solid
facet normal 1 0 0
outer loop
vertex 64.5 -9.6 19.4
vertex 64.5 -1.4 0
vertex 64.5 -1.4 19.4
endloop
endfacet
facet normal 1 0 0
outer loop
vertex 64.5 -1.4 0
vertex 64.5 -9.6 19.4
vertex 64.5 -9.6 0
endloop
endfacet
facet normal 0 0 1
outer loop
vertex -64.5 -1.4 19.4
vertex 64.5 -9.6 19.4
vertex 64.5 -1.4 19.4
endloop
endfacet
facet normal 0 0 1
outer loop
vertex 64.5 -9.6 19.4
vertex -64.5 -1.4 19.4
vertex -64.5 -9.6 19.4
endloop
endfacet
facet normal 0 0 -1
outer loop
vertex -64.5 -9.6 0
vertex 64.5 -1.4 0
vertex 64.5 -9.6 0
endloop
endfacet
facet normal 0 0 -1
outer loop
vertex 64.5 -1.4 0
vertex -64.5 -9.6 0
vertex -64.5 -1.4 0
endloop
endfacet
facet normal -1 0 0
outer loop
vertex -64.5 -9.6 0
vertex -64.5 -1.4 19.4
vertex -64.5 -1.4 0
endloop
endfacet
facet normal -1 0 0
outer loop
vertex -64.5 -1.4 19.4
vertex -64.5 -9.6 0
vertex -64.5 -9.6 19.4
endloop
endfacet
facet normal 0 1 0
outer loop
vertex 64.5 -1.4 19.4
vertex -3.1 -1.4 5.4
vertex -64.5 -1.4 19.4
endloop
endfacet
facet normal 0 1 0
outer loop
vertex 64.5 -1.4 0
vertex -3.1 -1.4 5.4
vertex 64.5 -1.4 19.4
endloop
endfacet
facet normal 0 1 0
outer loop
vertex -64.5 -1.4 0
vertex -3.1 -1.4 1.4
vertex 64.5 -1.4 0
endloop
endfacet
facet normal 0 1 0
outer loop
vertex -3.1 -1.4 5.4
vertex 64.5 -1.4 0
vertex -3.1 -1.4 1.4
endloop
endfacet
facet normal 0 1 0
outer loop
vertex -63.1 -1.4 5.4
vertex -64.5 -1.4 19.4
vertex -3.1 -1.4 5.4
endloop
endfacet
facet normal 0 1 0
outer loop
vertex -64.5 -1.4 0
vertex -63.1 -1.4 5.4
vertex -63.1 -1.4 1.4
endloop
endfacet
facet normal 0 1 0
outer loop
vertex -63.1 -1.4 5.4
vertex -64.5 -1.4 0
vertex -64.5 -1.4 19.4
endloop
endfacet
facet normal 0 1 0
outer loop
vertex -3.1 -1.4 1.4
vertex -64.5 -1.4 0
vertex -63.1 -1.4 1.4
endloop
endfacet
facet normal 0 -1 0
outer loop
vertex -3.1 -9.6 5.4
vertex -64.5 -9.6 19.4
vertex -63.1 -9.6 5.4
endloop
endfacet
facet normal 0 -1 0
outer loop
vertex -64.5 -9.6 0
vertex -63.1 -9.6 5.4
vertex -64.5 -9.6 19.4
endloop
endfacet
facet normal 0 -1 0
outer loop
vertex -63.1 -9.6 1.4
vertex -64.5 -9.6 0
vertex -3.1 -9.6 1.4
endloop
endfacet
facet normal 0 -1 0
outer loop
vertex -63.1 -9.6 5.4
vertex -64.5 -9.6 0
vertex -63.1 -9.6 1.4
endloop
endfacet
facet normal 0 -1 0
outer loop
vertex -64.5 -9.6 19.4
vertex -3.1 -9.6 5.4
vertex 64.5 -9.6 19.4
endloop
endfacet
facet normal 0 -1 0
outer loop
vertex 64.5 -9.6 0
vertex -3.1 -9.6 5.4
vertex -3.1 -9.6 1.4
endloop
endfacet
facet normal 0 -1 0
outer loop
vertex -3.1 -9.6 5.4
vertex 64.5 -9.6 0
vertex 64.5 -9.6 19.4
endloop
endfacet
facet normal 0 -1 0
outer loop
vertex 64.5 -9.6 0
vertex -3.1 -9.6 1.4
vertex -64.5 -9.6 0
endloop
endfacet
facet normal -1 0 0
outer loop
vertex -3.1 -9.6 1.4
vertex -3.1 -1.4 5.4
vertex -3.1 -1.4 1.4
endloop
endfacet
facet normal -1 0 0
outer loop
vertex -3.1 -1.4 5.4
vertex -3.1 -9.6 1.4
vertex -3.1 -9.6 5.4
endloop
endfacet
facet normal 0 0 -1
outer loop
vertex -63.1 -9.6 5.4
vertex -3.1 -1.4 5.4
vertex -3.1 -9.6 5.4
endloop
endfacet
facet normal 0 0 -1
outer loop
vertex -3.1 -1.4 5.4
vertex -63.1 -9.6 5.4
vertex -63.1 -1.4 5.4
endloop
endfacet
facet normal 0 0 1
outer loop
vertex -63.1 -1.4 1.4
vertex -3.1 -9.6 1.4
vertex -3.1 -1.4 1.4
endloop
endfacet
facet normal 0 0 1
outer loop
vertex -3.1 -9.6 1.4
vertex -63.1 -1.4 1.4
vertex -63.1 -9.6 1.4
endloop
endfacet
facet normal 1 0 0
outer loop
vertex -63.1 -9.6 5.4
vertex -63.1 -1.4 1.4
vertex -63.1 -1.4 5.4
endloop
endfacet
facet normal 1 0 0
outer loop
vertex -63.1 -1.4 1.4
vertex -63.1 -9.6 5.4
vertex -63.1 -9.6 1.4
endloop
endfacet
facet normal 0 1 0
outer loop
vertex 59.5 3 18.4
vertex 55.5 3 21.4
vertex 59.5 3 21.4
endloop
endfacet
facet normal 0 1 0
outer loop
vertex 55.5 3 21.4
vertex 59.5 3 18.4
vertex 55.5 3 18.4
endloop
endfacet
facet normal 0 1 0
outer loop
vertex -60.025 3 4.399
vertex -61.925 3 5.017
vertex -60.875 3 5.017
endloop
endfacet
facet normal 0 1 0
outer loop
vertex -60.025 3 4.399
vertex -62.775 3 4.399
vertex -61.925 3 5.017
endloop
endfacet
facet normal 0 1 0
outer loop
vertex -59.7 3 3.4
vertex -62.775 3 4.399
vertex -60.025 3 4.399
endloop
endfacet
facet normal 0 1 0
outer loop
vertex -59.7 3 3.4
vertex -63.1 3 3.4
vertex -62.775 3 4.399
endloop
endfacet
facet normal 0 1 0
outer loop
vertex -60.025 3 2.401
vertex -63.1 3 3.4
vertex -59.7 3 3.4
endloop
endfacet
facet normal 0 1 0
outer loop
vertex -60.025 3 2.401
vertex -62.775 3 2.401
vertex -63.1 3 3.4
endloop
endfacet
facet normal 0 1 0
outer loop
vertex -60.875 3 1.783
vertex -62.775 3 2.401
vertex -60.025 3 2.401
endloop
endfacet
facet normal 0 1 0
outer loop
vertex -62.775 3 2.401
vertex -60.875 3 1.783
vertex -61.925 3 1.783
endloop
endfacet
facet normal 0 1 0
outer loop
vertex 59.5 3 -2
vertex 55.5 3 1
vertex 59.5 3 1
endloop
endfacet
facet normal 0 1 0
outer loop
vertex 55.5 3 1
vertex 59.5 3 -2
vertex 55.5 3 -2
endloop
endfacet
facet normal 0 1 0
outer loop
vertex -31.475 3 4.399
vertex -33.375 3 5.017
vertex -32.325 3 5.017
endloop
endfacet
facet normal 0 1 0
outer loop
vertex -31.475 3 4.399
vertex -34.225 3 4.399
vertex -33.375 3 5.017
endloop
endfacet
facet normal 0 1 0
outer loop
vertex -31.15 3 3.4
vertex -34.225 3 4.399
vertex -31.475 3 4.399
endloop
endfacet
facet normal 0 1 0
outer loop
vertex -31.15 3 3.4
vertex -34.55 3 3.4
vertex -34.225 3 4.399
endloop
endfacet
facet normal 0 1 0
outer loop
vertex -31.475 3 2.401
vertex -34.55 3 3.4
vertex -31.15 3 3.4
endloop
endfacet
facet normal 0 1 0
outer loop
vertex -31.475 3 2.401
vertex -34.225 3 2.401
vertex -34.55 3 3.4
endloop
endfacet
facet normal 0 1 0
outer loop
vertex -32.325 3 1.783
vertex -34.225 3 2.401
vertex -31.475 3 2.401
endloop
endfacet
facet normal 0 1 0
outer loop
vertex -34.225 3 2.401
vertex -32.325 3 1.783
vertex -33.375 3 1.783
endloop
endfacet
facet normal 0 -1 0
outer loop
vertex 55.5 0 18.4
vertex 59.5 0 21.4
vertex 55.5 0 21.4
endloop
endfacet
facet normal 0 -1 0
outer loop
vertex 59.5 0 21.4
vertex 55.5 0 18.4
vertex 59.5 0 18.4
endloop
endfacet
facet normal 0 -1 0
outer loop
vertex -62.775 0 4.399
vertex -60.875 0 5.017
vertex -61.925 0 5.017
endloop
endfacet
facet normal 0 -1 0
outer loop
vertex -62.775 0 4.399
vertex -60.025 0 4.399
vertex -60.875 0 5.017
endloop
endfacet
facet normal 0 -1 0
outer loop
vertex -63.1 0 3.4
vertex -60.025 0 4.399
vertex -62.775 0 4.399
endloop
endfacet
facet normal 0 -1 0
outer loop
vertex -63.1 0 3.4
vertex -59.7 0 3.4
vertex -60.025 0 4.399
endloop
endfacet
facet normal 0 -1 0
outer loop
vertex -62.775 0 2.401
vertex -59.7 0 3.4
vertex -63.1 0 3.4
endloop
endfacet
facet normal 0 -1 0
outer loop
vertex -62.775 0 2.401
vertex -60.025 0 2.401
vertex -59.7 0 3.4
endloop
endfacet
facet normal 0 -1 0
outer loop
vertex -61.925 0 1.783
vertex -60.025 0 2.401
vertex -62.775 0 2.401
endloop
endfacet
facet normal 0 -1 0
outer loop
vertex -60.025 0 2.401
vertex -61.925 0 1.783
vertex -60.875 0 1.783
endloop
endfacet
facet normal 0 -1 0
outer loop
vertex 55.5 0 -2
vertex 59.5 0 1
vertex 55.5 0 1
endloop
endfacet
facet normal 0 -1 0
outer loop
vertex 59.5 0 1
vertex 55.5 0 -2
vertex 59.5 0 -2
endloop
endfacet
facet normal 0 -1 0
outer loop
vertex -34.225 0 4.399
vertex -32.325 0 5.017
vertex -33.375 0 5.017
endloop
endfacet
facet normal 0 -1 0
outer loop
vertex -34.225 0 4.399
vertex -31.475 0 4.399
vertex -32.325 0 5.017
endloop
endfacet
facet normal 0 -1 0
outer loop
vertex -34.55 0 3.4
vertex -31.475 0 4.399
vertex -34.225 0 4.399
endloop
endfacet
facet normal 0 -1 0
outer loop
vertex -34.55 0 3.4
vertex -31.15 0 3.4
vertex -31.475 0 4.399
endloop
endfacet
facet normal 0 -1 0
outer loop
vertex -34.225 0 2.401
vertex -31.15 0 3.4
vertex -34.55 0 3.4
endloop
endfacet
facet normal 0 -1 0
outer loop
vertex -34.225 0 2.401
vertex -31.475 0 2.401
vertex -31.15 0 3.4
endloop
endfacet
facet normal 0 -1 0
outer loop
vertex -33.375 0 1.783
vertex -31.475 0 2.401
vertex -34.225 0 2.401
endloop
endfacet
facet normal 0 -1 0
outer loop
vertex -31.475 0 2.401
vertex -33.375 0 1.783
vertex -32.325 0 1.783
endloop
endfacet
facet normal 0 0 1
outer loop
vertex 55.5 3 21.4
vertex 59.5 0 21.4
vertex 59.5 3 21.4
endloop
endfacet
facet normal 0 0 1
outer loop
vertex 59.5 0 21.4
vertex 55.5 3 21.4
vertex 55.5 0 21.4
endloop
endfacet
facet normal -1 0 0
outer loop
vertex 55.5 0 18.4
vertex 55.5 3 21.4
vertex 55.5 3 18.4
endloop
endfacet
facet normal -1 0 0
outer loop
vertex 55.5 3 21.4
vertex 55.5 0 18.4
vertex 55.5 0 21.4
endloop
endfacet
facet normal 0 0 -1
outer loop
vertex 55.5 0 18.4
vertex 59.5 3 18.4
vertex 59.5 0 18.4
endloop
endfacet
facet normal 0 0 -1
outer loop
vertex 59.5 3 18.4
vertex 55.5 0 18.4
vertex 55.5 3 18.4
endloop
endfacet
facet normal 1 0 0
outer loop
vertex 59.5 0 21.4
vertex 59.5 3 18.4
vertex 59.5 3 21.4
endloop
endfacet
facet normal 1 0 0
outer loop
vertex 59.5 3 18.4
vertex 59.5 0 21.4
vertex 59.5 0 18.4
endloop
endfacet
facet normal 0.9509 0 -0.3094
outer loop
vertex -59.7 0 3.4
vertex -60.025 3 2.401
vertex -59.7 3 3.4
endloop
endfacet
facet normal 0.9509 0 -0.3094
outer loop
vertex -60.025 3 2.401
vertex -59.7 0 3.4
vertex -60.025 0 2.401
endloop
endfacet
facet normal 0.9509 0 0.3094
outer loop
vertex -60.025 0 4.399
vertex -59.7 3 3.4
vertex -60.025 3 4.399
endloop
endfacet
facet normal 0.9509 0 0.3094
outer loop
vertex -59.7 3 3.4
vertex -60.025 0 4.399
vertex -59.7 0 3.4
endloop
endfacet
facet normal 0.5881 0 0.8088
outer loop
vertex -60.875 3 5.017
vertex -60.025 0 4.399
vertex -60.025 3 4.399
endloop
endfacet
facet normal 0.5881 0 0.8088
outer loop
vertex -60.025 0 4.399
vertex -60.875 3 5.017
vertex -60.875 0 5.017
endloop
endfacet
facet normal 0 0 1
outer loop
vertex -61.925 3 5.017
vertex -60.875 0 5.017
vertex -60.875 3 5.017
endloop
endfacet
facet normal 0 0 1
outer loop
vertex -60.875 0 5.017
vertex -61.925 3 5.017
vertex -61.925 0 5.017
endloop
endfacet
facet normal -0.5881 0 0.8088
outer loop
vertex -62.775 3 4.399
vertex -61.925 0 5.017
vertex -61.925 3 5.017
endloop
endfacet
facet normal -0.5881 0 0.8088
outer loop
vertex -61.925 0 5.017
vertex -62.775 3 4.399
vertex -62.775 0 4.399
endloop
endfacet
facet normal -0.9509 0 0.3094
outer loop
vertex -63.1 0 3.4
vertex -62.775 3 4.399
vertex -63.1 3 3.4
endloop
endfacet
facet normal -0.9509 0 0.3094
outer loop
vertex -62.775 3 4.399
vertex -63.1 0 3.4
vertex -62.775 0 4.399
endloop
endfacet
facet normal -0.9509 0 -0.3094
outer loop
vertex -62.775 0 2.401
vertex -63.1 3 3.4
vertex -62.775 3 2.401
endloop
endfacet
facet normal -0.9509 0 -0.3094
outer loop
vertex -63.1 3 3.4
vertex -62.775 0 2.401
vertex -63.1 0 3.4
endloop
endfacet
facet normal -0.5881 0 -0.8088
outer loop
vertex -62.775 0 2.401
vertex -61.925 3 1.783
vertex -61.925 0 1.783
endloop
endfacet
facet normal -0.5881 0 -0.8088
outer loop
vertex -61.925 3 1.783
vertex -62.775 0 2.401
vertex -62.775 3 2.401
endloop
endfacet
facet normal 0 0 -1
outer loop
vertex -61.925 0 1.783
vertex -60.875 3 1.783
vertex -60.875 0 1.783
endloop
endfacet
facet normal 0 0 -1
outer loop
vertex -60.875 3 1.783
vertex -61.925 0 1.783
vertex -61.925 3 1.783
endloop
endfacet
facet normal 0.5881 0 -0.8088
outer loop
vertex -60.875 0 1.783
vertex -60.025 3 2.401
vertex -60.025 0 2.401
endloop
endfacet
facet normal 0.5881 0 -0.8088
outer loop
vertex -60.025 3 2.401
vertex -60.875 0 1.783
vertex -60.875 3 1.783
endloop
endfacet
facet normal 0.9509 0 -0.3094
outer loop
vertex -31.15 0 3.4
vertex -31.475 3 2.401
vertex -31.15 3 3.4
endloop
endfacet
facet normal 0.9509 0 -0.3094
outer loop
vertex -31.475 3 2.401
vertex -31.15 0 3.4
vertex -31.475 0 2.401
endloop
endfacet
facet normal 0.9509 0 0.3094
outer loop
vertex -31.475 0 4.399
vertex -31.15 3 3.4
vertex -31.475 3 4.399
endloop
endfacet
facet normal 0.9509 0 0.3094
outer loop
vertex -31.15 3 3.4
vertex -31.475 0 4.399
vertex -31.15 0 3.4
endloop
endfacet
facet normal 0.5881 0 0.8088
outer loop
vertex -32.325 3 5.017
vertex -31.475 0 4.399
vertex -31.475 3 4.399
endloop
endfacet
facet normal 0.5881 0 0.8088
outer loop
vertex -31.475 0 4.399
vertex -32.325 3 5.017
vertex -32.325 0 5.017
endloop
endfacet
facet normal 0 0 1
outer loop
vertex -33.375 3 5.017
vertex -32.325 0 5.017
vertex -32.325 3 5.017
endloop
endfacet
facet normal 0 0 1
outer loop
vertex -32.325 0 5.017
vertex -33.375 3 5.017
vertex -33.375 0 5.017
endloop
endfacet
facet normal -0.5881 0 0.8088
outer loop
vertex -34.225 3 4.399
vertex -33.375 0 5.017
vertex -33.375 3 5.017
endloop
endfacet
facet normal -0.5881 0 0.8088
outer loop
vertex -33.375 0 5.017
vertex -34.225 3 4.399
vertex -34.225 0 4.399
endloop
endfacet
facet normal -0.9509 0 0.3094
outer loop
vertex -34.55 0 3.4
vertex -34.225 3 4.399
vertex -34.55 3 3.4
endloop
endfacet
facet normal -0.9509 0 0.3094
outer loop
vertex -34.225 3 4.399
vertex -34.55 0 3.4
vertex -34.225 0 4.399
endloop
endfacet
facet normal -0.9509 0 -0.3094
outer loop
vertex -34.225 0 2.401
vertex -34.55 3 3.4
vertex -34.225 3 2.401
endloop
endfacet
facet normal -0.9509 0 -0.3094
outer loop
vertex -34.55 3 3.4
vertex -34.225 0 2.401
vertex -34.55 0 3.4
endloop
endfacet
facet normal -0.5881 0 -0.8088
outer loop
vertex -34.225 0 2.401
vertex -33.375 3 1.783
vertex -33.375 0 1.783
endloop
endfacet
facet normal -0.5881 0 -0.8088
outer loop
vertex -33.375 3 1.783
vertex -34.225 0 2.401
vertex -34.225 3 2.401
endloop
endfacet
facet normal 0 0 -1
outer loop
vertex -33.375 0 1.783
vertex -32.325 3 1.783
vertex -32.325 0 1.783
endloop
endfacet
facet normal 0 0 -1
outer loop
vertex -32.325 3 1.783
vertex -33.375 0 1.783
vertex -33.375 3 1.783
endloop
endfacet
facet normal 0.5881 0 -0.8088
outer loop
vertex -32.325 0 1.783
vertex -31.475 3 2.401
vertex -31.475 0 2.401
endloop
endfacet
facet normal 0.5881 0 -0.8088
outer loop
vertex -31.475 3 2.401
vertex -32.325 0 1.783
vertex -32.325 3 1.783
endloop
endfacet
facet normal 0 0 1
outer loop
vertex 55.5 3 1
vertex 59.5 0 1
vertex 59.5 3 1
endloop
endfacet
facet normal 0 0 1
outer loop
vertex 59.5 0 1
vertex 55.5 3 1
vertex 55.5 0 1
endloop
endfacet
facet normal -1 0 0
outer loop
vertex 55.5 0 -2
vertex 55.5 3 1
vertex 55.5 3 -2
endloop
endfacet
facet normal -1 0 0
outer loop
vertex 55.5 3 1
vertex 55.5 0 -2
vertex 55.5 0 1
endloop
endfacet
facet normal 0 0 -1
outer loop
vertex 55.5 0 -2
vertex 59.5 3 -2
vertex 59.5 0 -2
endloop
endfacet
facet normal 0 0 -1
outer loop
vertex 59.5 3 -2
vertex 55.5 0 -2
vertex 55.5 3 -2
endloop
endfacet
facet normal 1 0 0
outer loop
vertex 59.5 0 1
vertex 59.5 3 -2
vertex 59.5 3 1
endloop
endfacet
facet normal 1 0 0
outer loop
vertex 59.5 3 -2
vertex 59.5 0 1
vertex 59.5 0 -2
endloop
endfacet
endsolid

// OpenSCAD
// Basic Model of Intel(R) RealSense(TM) R200 Depth Camera
//   also includes cutting plan for basic mounting
// Developed b0y: Michael McCool
// Copyright 2016 Intel Corporation
// License: CC-BY.  See LICENSE.md

// All units in mm unless noted otherwise.

sm_base = 10;  // "smoothness" of curves; larger->smoother
mount_hole_sm = sm_base;
m3_hole_radius = 3/2;

// CAMERA PARAMETERS

// basic overall size of camera
r200_x = 129;
r200_y = 8.2;
r200_z = 19.4;

// size and location of slot in camera
r200_sx = 60;
r200_sz = 4;
r200_six = 1.4;
r200_siz = 1.4;

// CAMERA MOUNT PARAMETERS
// size of mounting slot in frame
r200_mount_slot_x = 4; // width of slot
r200_mount_slot_y = 2; // height of slot
r200_mount_slot_ey = 1; // slot notch depth (behind camera)
r200_mount_slot_ix = 5; // offset of notch from end of camera

r200_mount_hole_r = m3_hole_radius;
r200_mount_hole_ix = r200_six + r200_mount_hole_r;
r200_mount_hole_iz = r200_siz + r200_sz/2;
r200_mount_hole_dx = r200_sx - r200_mount_hole_r - r200_six;
r200_mount_hole_sm = mount_hole_sm;

// thickness of magnetic mounting plate and tape
r200_plate_thick = 1.4;

// defaults 
r200_mount_hole_p = 0.5;  // relative location of inner mounting hole
r200_mount_hole_t = 0.2;  // tolerance of mounting hole
r200_mount_slot_t = 0.0;  // tolerance of mounting slot

// R200 Camera Model (3D)
module r200_camera() {
  color([0.1,0.1,0.7,0.9])
  translate([-r200_x/2,-r200_y-r200_plate_thick,0]) {
    difference() {
      cube([r200_x,r200_y,r200_z]);
      translate([r200_six,-0.05,r200_siz])
        cube([r200_sx,r200_y+0.1,r200_sz]);
    }
  }
}

// R200 Camera Mount Holes (2D)
module r200_camera_mounting_holes(
  hole_p = r200_mount_hole_p,
  hole_t = r200_mount_hole_t,
  slot_t = r200_mount_slot_t
) {
  // holes for bolts
  translate([-r200_x/2+r200_mount_hole_ix+hole_t,r200_mount_hole_iz])
    circle(r=r200_mount_hole_r+hole_t,$fn=mount_hole_sm);
  translate([-r200_x/2+r200_mount_hole_ix+hole_p*r200_mount_hole_dx+hole_t,r200_mount_hole_iz])
    circle(r=r200_mount_hole_r+hole_t,$fn=mount_hole_sm);
  
  // slots for cable ties
  translate([r200_x/2-r200_mount_slot_ix-r200_mount_slot_x-slot_t,-r200_mount_slot_y-slot_t])
    square([r200_mount_slot_x+2*slot_t,r200_mount_slot_y+r200_mount_slot_ey+2*slot_t]);
  translate([r200_x/2-r200_mount_slot_ix-r200_mount_slot_x,r200_z-r200_mount_slot_ey])
    square([r200_mount_slot_x+2*slot_t,r200_mount_slot_y+r200_mount_slot_ey+2*slot_t]);
}

// VISUALIZATION
r200_camera();
translate([0,3,0])
  rotate([90,0,0])
    linear_extrude(3)
      r200_camera_mounting_holes();
